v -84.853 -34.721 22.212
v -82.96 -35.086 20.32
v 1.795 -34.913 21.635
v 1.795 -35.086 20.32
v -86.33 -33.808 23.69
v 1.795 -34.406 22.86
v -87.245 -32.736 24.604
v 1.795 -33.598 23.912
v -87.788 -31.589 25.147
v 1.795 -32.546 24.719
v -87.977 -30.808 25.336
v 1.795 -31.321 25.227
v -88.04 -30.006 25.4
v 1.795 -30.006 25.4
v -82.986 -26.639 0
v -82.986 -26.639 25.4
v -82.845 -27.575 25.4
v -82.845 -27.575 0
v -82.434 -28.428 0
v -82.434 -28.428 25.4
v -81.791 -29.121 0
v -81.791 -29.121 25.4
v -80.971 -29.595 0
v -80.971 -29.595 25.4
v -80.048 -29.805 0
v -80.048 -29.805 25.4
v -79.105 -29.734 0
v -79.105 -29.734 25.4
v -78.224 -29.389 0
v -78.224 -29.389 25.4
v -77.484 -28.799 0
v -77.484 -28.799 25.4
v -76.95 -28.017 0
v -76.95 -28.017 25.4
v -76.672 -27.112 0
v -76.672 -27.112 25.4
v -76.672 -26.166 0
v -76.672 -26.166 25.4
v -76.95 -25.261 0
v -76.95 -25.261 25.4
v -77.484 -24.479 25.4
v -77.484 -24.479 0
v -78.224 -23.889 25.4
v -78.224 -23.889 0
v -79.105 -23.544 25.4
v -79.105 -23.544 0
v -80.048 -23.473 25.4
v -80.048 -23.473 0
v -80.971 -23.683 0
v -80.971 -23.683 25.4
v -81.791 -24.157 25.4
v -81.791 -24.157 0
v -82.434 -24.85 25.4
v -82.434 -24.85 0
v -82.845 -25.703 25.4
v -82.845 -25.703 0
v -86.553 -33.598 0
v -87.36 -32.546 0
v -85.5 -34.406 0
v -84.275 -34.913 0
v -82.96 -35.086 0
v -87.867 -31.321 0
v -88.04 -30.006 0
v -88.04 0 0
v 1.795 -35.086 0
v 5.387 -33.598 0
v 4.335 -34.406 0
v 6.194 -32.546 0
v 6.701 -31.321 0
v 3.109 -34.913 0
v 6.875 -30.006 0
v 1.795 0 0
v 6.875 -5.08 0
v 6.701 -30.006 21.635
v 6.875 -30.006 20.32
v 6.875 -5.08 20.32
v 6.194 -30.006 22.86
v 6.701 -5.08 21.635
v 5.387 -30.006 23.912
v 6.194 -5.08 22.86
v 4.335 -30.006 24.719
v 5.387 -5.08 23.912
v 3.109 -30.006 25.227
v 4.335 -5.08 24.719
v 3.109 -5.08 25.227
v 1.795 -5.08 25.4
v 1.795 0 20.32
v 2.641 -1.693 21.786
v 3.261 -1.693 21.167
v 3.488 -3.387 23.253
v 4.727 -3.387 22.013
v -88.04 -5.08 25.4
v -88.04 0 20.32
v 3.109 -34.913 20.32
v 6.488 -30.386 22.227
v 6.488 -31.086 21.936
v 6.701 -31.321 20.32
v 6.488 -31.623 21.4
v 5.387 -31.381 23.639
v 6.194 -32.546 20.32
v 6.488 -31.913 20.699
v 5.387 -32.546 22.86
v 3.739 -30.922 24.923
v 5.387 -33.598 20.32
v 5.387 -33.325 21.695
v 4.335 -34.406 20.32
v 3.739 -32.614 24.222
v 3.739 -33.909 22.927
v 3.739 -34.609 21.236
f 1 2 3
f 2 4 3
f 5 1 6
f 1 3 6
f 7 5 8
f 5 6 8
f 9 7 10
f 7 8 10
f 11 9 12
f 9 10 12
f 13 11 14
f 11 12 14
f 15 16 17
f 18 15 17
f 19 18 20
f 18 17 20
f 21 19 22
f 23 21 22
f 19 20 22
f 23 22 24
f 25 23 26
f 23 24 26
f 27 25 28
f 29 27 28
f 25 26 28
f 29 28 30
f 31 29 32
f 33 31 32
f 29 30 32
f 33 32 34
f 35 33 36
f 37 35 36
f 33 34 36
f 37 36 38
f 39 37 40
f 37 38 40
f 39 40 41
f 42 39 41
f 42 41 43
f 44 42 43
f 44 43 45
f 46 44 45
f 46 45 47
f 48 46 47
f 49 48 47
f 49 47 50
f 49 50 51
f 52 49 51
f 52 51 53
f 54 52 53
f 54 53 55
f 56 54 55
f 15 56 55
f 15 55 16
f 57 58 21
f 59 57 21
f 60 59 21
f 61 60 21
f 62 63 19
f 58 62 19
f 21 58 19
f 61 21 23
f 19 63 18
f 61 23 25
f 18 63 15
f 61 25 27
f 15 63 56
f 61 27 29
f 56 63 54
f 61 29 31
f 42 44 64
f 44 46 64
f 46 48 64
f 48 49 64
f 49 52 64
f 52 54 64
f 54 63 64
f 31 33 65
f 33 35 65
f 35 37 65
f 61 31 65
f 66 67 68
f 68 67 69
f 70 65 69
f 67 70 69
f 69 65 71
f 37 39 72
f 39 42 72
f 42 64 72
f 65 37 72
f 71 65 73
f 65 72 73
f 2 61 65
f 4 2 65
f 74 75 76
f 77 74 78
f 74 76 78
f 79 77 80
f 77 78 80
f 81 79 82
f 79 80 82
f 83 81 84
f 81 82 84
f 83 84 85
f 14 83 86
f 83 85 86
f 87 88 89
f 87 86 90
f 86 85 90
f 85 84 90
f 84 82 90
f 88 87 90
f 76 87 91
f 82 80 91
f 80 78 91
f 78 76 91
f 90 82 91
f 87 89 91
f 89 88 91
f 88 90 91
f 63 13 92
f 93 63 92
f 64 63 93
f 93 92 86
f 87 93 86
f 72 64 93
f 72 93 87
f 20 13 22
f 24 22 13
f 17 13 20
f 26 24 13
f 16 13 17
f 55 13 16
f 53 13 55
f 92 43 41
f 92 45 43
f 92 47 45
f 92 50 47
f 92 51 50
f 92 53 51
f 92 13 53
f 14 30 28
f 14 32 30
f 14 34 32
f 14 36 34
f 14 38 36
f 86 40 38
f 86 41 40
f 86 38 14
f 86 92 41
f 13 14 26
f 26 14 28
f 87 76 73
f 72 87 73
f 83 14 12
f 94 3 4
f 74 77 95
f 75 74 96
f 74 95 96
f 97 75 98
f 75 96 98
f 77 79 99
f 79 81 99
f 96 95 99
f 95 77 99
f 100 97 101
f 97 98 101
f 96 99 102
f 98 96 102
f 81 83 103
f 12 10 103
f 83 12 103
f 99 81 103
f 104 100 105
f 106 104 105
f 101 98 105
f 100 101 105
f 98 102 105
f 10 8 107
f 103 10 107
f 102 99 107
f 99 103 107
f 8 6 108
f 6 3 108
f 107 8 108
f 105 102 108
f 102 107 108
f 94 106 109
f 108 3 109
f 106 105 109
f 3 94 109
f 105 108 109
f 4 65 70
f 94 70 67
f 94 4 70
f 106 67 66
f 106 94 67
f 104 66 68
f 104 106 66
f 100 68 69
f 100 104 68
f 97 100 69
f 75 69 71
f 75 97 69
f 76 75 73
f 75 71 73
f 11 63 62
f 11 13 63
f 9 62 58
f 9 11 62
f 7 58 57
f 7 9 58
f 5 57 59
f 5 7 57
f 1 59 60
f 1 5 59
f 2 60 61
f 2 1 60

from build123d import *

# Parameters (mm, degrees)
F0_W     = 94.914917
F0_H     = 35.086341
F1_DEPTH = 25.4
F2_R     = 5.08
F3_SIZE  = 5.08
F5_D     = 6.35


with BuildPart() as f1:
    # F0 (on Top) → F1 (new body)
    with BuildSketch(Plane.XY):
        with Locations((-40.582946, -17.54317)):
            Rectangle(F0_W, F0_H)
    extrude(amount=F1_DEPTH)

    # F2
    f2_edges = [f1.edges().sort_by_distance(p)[0] for p in [
        (-40.582946, -35.086341, 25.4),
        (6.874513, -17.543171, 25.4),
        (6.874513, -35.086341, 12.7),
        (-88.040404, -35.086341, 12.7),
    ]]
    fillet(f2_edges, radius=F2_R)

    # F3
    f3_edges = [f1.edges().sort_by_distance(p)[0] for p in [
        (-43.122946, 0, 25.4),
    ]]
    chamfer(f3_edges, length=F3_SIZE)

    # F5 (through all)
    with Locations(Plane(origin=(0, 0, 0), x_dir=(1, 0, 0), z_dir=(0, 0, -1))):
        with Locations((-79.811066, 26.63902)):
            Hole(F5_D / 2)


solid = f1.part
